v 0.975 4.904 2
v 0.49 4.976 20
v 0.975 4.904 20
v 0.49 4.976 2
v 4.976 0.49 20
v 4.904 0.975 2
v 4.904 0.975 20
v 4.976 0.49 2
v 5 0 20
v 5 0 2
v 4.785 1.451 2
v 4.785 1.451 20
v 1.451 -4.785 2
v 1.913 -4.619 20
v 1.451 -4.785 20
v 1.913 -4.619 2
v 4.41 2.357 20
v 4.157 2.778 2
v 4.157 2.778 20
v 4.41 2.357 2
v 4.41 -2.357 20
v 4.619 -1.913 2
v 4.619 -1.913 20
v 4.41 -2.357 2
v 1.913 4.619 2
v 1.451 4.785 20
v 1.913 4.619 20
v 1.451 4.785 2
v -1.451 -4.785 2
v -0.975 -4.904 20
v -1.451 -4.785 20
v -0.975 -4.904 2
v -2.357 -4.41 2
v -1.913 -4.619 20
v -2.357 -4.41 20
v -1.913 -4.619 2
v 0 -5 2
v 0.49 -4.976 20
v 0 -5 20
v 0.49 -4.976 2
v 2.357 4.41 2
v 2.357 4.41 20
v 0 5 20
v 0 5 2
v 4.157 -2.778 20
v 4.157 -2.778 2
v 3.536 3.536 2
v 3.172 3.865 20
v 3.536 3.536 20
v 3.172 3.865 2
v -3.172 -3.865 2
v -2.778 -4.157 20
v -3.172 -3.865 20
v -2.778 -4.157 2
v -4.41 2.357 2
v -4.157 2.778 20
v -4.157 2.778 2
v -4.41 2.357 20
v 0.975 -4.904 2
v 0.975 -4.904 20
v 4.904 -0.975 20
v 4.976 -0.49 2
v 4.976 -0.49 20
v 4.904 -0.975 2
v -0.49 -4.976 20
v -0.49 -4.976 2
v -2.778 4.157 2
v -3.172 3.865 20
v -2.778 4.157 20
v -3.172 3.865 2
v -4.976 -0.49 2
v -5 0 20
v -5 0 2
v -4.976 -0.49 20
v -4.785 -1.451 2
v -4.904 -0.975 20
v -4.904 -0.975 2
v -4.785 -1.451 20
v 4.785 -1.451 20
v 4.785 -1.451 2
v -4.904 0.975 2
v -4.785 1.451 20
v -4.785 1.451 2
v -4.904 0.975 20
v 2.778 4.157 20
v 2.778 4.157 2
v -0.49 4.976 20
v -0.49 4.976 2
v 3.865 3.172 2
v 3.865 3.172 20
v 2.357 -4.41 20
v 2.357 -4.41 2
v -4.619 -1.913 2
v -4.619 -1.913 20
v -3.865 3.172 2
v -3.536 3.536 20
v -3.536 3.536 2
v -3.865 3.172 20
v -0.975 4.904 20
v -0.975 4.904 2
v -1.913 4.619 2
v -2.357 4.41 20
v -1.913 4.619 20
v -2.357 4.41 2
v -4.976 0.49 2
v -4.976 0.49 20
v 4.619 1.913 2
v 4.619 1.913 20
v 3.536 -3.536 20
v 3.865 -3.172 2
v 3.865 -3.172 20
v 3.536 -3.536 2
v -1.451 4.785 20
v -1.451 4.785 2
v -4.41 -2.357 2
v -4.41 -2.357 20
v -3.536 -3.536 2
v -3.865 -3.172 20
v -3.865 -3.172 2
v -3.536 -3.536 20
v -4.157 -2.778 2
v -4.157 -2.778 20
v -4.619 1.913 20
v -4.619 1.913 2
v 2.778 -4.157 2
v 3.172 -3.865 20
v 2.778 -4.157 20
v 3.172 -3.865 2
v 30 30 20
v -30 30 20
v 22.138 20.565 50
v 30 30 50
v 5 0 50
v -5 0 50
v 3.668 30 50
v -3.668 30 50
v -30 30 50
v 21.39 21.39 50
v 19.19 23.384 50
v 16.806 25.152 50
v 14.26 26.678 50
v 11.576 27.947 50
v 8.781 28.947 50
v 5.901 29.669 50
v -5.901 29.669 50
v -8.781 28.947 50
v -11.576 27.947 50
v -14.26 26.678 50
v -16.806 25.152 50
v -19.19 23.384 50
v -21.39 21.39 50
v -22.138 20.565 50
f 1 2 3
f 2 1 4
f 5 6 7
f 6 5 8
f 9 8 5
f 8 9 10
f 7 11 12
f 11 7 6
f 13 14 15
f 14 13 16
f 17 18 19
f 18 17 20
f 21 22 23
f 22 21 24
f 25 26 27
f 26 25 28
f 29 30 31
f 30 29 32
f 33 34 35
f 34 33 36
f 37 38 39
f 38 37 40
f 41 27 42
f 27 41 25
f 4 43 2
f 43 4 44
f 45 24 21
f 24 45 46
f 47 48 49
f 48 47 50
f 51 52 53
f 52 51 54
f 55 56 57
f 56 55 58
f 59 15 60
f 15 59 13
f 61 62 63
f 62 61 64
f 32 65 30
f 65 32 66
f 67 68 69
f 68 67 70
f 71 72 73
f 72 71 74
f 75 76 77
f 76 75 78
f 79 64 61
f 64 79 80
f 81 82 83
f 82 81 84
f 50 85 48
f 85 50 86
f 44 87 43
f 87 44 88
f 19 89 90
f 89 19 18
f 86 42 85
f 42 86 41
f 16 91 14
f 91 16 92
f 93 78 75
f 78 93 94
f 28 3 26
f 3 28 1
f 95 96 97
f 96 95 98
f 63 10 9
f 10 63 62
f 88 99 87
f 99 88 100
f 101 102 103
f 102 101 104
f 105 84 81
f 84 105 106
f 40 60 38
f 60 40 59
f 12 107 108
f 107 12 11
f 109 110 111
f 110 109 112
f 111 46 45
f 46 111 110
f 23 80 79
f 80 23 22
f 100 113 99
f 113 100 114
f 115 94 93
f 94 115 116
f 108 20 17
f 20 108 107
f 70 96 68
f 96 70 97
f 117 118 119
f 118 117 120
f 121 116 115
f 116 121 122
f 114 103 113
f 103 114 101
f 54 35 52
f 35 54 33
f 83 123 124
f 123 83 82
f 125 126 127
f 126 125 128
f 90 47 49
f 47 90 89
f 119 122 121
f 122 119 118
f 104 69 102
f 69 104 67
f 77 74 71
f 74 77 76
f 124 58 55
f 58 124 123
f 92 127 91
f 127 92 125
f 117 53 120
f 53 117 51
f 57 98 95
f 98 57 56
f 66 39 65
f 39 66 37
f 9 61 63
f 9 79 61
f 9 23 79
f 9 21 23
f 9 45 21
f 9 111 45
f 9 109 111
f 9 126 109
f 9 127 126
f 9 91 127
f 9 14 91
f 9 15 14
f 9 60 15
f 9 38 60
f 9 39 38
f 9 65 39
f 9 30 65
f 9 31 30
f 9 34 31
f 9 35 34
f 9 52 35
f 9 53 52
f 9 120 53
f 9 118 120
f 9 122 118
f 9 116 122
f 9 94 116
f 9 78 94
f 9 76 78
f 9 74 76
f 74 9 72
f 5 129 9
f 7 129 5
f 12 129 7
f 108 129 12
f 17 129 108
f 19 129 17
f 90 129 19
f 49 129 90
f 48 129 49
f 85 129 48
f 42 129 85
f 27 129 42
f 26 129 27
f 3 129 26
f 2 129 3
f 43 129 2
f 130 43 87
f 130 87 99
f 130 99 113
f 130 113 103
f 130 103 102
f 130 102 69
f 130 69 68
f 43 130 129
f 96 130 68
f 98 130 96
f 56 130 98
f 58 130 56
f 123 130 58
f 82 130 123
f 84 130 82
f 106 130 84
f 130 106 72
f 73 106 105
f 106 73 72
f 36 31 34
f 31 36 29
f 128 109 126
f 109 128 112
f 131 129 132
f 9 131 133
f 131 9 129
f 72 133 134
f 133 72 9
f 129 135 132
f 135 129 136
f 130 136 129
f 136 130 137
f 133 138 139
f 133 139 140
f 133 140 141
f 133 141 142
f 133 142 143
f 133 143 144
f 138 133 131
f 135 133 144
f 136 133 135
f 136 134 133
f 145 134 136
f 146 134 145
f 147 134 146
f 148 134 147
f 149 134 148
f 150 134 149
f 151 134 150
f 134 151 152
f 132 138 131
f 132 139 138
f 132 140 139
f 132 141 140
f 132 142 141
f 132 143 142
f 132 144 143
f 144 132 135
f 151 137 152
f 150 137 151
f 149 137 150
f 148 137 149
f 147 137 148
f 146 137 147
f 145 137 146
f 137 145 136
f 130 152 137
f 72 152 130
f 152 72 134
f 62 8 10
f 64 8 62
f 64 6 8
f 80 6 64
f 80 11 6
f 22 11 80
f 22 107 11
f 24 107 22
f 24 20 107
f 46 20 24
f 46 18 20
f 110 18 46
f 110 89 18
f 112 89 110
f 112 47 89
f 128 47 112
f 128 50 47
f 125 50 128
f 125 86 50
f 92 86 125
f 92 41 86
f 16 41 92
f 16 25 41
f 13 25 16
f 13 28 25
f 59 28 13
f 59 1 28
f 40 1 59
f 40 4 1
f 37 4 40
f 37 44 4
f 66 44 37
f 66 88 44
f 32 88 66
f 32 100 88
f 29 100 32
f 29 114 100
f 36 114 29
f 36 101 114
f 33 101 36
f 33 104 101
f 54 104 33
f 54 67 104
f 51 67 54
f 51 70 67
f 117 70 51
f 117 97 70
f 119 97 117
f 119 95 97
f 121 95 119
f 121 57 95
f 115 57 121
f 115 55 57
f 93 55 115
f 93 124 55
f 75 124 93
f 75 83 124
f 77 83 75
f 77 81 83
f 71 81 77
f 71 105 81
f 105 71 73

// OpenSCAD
// Lab Funnel - A straight spout tube with a conical funnel body, open at top and bottom.
// Printed upright with the wide opening at the top.
// Corrected to start at z=0 and have a fully open bottom.

// Dimensions
spout_od    = 10;      // Outer diameter of straight spout
spout_id    = 6.8;     // Inner diameter of straight spout (10 - 2*1.6)
spout_len   = 20;      // Length of straight spout (z=0 to z=20)
funnel_start_od = 10;  // Outer diameter at start of cone (z=20)
funnel_end_od  = 60;   // Outer diameter at rim (z=50)
funnel_len    = 30;    // Length of cone section (50 - 20)
wall_thick    = 1.6;   // Wall thickness everywhere

// Derived dimensions
funnel_start_id = funnel_start_od - 2 * wall_thick; // 6.8
funnel_end_id   = funnel_end_od - 2 * wall_thick;  // 52.8

$fn = 64;

// Build the solid part
difference() {
    union() {
        // 1. Straight Spout (Tube)
        // Outer cylinder
        translate([0, 0, 0]) 
            cylinder(h = spout_len, d = spout_od);
        
        // Inner cylinder (hole)
        translate([0, 0, 0]) 
            cylinder(h = spout_len, d = spout_id);

        // 2. Conical Funnel Body
        // Outer cone
        translate([0, 0, spout_len]) 
            linear_extrude(height = funnel_len) 
                polygon([
                    [spout_od / 2, 0],
                    [funnel_end_od / 2, funnel_len],
                    [-funnel_end_od / 2, funnel_len],
                    [-spout_od / 2, 0]
                ]);
        
        // Inner cone (hole)
        translate([0, 0, spout_len]) 
            linear_extrude(height = funnel_len) 
                polygon([
                    [spout_id / 2, 0],
                    [funnel_end_id / 2, funnel_len],
                    [-funnel_end_id / 2, funnel_len],
                    [-spout_id / 2, 0]
                ]);
    }
    
    // Cut the top opening (rim)
    // Extend slightly past the rim to ensure clean cut
    translate([0, 0, spout_len + funnel_len]) 
        cylinder(h = 2, d = funnel_end_od + 0.5);
    
    // Cut the bottom opening (spout tip)
    // Extend significantly past the tip to ensure clean cut through the solid base
    translate([0, 0, -1]) 
        cylinder(h = 3, d = spout_od + 0.5);
}
